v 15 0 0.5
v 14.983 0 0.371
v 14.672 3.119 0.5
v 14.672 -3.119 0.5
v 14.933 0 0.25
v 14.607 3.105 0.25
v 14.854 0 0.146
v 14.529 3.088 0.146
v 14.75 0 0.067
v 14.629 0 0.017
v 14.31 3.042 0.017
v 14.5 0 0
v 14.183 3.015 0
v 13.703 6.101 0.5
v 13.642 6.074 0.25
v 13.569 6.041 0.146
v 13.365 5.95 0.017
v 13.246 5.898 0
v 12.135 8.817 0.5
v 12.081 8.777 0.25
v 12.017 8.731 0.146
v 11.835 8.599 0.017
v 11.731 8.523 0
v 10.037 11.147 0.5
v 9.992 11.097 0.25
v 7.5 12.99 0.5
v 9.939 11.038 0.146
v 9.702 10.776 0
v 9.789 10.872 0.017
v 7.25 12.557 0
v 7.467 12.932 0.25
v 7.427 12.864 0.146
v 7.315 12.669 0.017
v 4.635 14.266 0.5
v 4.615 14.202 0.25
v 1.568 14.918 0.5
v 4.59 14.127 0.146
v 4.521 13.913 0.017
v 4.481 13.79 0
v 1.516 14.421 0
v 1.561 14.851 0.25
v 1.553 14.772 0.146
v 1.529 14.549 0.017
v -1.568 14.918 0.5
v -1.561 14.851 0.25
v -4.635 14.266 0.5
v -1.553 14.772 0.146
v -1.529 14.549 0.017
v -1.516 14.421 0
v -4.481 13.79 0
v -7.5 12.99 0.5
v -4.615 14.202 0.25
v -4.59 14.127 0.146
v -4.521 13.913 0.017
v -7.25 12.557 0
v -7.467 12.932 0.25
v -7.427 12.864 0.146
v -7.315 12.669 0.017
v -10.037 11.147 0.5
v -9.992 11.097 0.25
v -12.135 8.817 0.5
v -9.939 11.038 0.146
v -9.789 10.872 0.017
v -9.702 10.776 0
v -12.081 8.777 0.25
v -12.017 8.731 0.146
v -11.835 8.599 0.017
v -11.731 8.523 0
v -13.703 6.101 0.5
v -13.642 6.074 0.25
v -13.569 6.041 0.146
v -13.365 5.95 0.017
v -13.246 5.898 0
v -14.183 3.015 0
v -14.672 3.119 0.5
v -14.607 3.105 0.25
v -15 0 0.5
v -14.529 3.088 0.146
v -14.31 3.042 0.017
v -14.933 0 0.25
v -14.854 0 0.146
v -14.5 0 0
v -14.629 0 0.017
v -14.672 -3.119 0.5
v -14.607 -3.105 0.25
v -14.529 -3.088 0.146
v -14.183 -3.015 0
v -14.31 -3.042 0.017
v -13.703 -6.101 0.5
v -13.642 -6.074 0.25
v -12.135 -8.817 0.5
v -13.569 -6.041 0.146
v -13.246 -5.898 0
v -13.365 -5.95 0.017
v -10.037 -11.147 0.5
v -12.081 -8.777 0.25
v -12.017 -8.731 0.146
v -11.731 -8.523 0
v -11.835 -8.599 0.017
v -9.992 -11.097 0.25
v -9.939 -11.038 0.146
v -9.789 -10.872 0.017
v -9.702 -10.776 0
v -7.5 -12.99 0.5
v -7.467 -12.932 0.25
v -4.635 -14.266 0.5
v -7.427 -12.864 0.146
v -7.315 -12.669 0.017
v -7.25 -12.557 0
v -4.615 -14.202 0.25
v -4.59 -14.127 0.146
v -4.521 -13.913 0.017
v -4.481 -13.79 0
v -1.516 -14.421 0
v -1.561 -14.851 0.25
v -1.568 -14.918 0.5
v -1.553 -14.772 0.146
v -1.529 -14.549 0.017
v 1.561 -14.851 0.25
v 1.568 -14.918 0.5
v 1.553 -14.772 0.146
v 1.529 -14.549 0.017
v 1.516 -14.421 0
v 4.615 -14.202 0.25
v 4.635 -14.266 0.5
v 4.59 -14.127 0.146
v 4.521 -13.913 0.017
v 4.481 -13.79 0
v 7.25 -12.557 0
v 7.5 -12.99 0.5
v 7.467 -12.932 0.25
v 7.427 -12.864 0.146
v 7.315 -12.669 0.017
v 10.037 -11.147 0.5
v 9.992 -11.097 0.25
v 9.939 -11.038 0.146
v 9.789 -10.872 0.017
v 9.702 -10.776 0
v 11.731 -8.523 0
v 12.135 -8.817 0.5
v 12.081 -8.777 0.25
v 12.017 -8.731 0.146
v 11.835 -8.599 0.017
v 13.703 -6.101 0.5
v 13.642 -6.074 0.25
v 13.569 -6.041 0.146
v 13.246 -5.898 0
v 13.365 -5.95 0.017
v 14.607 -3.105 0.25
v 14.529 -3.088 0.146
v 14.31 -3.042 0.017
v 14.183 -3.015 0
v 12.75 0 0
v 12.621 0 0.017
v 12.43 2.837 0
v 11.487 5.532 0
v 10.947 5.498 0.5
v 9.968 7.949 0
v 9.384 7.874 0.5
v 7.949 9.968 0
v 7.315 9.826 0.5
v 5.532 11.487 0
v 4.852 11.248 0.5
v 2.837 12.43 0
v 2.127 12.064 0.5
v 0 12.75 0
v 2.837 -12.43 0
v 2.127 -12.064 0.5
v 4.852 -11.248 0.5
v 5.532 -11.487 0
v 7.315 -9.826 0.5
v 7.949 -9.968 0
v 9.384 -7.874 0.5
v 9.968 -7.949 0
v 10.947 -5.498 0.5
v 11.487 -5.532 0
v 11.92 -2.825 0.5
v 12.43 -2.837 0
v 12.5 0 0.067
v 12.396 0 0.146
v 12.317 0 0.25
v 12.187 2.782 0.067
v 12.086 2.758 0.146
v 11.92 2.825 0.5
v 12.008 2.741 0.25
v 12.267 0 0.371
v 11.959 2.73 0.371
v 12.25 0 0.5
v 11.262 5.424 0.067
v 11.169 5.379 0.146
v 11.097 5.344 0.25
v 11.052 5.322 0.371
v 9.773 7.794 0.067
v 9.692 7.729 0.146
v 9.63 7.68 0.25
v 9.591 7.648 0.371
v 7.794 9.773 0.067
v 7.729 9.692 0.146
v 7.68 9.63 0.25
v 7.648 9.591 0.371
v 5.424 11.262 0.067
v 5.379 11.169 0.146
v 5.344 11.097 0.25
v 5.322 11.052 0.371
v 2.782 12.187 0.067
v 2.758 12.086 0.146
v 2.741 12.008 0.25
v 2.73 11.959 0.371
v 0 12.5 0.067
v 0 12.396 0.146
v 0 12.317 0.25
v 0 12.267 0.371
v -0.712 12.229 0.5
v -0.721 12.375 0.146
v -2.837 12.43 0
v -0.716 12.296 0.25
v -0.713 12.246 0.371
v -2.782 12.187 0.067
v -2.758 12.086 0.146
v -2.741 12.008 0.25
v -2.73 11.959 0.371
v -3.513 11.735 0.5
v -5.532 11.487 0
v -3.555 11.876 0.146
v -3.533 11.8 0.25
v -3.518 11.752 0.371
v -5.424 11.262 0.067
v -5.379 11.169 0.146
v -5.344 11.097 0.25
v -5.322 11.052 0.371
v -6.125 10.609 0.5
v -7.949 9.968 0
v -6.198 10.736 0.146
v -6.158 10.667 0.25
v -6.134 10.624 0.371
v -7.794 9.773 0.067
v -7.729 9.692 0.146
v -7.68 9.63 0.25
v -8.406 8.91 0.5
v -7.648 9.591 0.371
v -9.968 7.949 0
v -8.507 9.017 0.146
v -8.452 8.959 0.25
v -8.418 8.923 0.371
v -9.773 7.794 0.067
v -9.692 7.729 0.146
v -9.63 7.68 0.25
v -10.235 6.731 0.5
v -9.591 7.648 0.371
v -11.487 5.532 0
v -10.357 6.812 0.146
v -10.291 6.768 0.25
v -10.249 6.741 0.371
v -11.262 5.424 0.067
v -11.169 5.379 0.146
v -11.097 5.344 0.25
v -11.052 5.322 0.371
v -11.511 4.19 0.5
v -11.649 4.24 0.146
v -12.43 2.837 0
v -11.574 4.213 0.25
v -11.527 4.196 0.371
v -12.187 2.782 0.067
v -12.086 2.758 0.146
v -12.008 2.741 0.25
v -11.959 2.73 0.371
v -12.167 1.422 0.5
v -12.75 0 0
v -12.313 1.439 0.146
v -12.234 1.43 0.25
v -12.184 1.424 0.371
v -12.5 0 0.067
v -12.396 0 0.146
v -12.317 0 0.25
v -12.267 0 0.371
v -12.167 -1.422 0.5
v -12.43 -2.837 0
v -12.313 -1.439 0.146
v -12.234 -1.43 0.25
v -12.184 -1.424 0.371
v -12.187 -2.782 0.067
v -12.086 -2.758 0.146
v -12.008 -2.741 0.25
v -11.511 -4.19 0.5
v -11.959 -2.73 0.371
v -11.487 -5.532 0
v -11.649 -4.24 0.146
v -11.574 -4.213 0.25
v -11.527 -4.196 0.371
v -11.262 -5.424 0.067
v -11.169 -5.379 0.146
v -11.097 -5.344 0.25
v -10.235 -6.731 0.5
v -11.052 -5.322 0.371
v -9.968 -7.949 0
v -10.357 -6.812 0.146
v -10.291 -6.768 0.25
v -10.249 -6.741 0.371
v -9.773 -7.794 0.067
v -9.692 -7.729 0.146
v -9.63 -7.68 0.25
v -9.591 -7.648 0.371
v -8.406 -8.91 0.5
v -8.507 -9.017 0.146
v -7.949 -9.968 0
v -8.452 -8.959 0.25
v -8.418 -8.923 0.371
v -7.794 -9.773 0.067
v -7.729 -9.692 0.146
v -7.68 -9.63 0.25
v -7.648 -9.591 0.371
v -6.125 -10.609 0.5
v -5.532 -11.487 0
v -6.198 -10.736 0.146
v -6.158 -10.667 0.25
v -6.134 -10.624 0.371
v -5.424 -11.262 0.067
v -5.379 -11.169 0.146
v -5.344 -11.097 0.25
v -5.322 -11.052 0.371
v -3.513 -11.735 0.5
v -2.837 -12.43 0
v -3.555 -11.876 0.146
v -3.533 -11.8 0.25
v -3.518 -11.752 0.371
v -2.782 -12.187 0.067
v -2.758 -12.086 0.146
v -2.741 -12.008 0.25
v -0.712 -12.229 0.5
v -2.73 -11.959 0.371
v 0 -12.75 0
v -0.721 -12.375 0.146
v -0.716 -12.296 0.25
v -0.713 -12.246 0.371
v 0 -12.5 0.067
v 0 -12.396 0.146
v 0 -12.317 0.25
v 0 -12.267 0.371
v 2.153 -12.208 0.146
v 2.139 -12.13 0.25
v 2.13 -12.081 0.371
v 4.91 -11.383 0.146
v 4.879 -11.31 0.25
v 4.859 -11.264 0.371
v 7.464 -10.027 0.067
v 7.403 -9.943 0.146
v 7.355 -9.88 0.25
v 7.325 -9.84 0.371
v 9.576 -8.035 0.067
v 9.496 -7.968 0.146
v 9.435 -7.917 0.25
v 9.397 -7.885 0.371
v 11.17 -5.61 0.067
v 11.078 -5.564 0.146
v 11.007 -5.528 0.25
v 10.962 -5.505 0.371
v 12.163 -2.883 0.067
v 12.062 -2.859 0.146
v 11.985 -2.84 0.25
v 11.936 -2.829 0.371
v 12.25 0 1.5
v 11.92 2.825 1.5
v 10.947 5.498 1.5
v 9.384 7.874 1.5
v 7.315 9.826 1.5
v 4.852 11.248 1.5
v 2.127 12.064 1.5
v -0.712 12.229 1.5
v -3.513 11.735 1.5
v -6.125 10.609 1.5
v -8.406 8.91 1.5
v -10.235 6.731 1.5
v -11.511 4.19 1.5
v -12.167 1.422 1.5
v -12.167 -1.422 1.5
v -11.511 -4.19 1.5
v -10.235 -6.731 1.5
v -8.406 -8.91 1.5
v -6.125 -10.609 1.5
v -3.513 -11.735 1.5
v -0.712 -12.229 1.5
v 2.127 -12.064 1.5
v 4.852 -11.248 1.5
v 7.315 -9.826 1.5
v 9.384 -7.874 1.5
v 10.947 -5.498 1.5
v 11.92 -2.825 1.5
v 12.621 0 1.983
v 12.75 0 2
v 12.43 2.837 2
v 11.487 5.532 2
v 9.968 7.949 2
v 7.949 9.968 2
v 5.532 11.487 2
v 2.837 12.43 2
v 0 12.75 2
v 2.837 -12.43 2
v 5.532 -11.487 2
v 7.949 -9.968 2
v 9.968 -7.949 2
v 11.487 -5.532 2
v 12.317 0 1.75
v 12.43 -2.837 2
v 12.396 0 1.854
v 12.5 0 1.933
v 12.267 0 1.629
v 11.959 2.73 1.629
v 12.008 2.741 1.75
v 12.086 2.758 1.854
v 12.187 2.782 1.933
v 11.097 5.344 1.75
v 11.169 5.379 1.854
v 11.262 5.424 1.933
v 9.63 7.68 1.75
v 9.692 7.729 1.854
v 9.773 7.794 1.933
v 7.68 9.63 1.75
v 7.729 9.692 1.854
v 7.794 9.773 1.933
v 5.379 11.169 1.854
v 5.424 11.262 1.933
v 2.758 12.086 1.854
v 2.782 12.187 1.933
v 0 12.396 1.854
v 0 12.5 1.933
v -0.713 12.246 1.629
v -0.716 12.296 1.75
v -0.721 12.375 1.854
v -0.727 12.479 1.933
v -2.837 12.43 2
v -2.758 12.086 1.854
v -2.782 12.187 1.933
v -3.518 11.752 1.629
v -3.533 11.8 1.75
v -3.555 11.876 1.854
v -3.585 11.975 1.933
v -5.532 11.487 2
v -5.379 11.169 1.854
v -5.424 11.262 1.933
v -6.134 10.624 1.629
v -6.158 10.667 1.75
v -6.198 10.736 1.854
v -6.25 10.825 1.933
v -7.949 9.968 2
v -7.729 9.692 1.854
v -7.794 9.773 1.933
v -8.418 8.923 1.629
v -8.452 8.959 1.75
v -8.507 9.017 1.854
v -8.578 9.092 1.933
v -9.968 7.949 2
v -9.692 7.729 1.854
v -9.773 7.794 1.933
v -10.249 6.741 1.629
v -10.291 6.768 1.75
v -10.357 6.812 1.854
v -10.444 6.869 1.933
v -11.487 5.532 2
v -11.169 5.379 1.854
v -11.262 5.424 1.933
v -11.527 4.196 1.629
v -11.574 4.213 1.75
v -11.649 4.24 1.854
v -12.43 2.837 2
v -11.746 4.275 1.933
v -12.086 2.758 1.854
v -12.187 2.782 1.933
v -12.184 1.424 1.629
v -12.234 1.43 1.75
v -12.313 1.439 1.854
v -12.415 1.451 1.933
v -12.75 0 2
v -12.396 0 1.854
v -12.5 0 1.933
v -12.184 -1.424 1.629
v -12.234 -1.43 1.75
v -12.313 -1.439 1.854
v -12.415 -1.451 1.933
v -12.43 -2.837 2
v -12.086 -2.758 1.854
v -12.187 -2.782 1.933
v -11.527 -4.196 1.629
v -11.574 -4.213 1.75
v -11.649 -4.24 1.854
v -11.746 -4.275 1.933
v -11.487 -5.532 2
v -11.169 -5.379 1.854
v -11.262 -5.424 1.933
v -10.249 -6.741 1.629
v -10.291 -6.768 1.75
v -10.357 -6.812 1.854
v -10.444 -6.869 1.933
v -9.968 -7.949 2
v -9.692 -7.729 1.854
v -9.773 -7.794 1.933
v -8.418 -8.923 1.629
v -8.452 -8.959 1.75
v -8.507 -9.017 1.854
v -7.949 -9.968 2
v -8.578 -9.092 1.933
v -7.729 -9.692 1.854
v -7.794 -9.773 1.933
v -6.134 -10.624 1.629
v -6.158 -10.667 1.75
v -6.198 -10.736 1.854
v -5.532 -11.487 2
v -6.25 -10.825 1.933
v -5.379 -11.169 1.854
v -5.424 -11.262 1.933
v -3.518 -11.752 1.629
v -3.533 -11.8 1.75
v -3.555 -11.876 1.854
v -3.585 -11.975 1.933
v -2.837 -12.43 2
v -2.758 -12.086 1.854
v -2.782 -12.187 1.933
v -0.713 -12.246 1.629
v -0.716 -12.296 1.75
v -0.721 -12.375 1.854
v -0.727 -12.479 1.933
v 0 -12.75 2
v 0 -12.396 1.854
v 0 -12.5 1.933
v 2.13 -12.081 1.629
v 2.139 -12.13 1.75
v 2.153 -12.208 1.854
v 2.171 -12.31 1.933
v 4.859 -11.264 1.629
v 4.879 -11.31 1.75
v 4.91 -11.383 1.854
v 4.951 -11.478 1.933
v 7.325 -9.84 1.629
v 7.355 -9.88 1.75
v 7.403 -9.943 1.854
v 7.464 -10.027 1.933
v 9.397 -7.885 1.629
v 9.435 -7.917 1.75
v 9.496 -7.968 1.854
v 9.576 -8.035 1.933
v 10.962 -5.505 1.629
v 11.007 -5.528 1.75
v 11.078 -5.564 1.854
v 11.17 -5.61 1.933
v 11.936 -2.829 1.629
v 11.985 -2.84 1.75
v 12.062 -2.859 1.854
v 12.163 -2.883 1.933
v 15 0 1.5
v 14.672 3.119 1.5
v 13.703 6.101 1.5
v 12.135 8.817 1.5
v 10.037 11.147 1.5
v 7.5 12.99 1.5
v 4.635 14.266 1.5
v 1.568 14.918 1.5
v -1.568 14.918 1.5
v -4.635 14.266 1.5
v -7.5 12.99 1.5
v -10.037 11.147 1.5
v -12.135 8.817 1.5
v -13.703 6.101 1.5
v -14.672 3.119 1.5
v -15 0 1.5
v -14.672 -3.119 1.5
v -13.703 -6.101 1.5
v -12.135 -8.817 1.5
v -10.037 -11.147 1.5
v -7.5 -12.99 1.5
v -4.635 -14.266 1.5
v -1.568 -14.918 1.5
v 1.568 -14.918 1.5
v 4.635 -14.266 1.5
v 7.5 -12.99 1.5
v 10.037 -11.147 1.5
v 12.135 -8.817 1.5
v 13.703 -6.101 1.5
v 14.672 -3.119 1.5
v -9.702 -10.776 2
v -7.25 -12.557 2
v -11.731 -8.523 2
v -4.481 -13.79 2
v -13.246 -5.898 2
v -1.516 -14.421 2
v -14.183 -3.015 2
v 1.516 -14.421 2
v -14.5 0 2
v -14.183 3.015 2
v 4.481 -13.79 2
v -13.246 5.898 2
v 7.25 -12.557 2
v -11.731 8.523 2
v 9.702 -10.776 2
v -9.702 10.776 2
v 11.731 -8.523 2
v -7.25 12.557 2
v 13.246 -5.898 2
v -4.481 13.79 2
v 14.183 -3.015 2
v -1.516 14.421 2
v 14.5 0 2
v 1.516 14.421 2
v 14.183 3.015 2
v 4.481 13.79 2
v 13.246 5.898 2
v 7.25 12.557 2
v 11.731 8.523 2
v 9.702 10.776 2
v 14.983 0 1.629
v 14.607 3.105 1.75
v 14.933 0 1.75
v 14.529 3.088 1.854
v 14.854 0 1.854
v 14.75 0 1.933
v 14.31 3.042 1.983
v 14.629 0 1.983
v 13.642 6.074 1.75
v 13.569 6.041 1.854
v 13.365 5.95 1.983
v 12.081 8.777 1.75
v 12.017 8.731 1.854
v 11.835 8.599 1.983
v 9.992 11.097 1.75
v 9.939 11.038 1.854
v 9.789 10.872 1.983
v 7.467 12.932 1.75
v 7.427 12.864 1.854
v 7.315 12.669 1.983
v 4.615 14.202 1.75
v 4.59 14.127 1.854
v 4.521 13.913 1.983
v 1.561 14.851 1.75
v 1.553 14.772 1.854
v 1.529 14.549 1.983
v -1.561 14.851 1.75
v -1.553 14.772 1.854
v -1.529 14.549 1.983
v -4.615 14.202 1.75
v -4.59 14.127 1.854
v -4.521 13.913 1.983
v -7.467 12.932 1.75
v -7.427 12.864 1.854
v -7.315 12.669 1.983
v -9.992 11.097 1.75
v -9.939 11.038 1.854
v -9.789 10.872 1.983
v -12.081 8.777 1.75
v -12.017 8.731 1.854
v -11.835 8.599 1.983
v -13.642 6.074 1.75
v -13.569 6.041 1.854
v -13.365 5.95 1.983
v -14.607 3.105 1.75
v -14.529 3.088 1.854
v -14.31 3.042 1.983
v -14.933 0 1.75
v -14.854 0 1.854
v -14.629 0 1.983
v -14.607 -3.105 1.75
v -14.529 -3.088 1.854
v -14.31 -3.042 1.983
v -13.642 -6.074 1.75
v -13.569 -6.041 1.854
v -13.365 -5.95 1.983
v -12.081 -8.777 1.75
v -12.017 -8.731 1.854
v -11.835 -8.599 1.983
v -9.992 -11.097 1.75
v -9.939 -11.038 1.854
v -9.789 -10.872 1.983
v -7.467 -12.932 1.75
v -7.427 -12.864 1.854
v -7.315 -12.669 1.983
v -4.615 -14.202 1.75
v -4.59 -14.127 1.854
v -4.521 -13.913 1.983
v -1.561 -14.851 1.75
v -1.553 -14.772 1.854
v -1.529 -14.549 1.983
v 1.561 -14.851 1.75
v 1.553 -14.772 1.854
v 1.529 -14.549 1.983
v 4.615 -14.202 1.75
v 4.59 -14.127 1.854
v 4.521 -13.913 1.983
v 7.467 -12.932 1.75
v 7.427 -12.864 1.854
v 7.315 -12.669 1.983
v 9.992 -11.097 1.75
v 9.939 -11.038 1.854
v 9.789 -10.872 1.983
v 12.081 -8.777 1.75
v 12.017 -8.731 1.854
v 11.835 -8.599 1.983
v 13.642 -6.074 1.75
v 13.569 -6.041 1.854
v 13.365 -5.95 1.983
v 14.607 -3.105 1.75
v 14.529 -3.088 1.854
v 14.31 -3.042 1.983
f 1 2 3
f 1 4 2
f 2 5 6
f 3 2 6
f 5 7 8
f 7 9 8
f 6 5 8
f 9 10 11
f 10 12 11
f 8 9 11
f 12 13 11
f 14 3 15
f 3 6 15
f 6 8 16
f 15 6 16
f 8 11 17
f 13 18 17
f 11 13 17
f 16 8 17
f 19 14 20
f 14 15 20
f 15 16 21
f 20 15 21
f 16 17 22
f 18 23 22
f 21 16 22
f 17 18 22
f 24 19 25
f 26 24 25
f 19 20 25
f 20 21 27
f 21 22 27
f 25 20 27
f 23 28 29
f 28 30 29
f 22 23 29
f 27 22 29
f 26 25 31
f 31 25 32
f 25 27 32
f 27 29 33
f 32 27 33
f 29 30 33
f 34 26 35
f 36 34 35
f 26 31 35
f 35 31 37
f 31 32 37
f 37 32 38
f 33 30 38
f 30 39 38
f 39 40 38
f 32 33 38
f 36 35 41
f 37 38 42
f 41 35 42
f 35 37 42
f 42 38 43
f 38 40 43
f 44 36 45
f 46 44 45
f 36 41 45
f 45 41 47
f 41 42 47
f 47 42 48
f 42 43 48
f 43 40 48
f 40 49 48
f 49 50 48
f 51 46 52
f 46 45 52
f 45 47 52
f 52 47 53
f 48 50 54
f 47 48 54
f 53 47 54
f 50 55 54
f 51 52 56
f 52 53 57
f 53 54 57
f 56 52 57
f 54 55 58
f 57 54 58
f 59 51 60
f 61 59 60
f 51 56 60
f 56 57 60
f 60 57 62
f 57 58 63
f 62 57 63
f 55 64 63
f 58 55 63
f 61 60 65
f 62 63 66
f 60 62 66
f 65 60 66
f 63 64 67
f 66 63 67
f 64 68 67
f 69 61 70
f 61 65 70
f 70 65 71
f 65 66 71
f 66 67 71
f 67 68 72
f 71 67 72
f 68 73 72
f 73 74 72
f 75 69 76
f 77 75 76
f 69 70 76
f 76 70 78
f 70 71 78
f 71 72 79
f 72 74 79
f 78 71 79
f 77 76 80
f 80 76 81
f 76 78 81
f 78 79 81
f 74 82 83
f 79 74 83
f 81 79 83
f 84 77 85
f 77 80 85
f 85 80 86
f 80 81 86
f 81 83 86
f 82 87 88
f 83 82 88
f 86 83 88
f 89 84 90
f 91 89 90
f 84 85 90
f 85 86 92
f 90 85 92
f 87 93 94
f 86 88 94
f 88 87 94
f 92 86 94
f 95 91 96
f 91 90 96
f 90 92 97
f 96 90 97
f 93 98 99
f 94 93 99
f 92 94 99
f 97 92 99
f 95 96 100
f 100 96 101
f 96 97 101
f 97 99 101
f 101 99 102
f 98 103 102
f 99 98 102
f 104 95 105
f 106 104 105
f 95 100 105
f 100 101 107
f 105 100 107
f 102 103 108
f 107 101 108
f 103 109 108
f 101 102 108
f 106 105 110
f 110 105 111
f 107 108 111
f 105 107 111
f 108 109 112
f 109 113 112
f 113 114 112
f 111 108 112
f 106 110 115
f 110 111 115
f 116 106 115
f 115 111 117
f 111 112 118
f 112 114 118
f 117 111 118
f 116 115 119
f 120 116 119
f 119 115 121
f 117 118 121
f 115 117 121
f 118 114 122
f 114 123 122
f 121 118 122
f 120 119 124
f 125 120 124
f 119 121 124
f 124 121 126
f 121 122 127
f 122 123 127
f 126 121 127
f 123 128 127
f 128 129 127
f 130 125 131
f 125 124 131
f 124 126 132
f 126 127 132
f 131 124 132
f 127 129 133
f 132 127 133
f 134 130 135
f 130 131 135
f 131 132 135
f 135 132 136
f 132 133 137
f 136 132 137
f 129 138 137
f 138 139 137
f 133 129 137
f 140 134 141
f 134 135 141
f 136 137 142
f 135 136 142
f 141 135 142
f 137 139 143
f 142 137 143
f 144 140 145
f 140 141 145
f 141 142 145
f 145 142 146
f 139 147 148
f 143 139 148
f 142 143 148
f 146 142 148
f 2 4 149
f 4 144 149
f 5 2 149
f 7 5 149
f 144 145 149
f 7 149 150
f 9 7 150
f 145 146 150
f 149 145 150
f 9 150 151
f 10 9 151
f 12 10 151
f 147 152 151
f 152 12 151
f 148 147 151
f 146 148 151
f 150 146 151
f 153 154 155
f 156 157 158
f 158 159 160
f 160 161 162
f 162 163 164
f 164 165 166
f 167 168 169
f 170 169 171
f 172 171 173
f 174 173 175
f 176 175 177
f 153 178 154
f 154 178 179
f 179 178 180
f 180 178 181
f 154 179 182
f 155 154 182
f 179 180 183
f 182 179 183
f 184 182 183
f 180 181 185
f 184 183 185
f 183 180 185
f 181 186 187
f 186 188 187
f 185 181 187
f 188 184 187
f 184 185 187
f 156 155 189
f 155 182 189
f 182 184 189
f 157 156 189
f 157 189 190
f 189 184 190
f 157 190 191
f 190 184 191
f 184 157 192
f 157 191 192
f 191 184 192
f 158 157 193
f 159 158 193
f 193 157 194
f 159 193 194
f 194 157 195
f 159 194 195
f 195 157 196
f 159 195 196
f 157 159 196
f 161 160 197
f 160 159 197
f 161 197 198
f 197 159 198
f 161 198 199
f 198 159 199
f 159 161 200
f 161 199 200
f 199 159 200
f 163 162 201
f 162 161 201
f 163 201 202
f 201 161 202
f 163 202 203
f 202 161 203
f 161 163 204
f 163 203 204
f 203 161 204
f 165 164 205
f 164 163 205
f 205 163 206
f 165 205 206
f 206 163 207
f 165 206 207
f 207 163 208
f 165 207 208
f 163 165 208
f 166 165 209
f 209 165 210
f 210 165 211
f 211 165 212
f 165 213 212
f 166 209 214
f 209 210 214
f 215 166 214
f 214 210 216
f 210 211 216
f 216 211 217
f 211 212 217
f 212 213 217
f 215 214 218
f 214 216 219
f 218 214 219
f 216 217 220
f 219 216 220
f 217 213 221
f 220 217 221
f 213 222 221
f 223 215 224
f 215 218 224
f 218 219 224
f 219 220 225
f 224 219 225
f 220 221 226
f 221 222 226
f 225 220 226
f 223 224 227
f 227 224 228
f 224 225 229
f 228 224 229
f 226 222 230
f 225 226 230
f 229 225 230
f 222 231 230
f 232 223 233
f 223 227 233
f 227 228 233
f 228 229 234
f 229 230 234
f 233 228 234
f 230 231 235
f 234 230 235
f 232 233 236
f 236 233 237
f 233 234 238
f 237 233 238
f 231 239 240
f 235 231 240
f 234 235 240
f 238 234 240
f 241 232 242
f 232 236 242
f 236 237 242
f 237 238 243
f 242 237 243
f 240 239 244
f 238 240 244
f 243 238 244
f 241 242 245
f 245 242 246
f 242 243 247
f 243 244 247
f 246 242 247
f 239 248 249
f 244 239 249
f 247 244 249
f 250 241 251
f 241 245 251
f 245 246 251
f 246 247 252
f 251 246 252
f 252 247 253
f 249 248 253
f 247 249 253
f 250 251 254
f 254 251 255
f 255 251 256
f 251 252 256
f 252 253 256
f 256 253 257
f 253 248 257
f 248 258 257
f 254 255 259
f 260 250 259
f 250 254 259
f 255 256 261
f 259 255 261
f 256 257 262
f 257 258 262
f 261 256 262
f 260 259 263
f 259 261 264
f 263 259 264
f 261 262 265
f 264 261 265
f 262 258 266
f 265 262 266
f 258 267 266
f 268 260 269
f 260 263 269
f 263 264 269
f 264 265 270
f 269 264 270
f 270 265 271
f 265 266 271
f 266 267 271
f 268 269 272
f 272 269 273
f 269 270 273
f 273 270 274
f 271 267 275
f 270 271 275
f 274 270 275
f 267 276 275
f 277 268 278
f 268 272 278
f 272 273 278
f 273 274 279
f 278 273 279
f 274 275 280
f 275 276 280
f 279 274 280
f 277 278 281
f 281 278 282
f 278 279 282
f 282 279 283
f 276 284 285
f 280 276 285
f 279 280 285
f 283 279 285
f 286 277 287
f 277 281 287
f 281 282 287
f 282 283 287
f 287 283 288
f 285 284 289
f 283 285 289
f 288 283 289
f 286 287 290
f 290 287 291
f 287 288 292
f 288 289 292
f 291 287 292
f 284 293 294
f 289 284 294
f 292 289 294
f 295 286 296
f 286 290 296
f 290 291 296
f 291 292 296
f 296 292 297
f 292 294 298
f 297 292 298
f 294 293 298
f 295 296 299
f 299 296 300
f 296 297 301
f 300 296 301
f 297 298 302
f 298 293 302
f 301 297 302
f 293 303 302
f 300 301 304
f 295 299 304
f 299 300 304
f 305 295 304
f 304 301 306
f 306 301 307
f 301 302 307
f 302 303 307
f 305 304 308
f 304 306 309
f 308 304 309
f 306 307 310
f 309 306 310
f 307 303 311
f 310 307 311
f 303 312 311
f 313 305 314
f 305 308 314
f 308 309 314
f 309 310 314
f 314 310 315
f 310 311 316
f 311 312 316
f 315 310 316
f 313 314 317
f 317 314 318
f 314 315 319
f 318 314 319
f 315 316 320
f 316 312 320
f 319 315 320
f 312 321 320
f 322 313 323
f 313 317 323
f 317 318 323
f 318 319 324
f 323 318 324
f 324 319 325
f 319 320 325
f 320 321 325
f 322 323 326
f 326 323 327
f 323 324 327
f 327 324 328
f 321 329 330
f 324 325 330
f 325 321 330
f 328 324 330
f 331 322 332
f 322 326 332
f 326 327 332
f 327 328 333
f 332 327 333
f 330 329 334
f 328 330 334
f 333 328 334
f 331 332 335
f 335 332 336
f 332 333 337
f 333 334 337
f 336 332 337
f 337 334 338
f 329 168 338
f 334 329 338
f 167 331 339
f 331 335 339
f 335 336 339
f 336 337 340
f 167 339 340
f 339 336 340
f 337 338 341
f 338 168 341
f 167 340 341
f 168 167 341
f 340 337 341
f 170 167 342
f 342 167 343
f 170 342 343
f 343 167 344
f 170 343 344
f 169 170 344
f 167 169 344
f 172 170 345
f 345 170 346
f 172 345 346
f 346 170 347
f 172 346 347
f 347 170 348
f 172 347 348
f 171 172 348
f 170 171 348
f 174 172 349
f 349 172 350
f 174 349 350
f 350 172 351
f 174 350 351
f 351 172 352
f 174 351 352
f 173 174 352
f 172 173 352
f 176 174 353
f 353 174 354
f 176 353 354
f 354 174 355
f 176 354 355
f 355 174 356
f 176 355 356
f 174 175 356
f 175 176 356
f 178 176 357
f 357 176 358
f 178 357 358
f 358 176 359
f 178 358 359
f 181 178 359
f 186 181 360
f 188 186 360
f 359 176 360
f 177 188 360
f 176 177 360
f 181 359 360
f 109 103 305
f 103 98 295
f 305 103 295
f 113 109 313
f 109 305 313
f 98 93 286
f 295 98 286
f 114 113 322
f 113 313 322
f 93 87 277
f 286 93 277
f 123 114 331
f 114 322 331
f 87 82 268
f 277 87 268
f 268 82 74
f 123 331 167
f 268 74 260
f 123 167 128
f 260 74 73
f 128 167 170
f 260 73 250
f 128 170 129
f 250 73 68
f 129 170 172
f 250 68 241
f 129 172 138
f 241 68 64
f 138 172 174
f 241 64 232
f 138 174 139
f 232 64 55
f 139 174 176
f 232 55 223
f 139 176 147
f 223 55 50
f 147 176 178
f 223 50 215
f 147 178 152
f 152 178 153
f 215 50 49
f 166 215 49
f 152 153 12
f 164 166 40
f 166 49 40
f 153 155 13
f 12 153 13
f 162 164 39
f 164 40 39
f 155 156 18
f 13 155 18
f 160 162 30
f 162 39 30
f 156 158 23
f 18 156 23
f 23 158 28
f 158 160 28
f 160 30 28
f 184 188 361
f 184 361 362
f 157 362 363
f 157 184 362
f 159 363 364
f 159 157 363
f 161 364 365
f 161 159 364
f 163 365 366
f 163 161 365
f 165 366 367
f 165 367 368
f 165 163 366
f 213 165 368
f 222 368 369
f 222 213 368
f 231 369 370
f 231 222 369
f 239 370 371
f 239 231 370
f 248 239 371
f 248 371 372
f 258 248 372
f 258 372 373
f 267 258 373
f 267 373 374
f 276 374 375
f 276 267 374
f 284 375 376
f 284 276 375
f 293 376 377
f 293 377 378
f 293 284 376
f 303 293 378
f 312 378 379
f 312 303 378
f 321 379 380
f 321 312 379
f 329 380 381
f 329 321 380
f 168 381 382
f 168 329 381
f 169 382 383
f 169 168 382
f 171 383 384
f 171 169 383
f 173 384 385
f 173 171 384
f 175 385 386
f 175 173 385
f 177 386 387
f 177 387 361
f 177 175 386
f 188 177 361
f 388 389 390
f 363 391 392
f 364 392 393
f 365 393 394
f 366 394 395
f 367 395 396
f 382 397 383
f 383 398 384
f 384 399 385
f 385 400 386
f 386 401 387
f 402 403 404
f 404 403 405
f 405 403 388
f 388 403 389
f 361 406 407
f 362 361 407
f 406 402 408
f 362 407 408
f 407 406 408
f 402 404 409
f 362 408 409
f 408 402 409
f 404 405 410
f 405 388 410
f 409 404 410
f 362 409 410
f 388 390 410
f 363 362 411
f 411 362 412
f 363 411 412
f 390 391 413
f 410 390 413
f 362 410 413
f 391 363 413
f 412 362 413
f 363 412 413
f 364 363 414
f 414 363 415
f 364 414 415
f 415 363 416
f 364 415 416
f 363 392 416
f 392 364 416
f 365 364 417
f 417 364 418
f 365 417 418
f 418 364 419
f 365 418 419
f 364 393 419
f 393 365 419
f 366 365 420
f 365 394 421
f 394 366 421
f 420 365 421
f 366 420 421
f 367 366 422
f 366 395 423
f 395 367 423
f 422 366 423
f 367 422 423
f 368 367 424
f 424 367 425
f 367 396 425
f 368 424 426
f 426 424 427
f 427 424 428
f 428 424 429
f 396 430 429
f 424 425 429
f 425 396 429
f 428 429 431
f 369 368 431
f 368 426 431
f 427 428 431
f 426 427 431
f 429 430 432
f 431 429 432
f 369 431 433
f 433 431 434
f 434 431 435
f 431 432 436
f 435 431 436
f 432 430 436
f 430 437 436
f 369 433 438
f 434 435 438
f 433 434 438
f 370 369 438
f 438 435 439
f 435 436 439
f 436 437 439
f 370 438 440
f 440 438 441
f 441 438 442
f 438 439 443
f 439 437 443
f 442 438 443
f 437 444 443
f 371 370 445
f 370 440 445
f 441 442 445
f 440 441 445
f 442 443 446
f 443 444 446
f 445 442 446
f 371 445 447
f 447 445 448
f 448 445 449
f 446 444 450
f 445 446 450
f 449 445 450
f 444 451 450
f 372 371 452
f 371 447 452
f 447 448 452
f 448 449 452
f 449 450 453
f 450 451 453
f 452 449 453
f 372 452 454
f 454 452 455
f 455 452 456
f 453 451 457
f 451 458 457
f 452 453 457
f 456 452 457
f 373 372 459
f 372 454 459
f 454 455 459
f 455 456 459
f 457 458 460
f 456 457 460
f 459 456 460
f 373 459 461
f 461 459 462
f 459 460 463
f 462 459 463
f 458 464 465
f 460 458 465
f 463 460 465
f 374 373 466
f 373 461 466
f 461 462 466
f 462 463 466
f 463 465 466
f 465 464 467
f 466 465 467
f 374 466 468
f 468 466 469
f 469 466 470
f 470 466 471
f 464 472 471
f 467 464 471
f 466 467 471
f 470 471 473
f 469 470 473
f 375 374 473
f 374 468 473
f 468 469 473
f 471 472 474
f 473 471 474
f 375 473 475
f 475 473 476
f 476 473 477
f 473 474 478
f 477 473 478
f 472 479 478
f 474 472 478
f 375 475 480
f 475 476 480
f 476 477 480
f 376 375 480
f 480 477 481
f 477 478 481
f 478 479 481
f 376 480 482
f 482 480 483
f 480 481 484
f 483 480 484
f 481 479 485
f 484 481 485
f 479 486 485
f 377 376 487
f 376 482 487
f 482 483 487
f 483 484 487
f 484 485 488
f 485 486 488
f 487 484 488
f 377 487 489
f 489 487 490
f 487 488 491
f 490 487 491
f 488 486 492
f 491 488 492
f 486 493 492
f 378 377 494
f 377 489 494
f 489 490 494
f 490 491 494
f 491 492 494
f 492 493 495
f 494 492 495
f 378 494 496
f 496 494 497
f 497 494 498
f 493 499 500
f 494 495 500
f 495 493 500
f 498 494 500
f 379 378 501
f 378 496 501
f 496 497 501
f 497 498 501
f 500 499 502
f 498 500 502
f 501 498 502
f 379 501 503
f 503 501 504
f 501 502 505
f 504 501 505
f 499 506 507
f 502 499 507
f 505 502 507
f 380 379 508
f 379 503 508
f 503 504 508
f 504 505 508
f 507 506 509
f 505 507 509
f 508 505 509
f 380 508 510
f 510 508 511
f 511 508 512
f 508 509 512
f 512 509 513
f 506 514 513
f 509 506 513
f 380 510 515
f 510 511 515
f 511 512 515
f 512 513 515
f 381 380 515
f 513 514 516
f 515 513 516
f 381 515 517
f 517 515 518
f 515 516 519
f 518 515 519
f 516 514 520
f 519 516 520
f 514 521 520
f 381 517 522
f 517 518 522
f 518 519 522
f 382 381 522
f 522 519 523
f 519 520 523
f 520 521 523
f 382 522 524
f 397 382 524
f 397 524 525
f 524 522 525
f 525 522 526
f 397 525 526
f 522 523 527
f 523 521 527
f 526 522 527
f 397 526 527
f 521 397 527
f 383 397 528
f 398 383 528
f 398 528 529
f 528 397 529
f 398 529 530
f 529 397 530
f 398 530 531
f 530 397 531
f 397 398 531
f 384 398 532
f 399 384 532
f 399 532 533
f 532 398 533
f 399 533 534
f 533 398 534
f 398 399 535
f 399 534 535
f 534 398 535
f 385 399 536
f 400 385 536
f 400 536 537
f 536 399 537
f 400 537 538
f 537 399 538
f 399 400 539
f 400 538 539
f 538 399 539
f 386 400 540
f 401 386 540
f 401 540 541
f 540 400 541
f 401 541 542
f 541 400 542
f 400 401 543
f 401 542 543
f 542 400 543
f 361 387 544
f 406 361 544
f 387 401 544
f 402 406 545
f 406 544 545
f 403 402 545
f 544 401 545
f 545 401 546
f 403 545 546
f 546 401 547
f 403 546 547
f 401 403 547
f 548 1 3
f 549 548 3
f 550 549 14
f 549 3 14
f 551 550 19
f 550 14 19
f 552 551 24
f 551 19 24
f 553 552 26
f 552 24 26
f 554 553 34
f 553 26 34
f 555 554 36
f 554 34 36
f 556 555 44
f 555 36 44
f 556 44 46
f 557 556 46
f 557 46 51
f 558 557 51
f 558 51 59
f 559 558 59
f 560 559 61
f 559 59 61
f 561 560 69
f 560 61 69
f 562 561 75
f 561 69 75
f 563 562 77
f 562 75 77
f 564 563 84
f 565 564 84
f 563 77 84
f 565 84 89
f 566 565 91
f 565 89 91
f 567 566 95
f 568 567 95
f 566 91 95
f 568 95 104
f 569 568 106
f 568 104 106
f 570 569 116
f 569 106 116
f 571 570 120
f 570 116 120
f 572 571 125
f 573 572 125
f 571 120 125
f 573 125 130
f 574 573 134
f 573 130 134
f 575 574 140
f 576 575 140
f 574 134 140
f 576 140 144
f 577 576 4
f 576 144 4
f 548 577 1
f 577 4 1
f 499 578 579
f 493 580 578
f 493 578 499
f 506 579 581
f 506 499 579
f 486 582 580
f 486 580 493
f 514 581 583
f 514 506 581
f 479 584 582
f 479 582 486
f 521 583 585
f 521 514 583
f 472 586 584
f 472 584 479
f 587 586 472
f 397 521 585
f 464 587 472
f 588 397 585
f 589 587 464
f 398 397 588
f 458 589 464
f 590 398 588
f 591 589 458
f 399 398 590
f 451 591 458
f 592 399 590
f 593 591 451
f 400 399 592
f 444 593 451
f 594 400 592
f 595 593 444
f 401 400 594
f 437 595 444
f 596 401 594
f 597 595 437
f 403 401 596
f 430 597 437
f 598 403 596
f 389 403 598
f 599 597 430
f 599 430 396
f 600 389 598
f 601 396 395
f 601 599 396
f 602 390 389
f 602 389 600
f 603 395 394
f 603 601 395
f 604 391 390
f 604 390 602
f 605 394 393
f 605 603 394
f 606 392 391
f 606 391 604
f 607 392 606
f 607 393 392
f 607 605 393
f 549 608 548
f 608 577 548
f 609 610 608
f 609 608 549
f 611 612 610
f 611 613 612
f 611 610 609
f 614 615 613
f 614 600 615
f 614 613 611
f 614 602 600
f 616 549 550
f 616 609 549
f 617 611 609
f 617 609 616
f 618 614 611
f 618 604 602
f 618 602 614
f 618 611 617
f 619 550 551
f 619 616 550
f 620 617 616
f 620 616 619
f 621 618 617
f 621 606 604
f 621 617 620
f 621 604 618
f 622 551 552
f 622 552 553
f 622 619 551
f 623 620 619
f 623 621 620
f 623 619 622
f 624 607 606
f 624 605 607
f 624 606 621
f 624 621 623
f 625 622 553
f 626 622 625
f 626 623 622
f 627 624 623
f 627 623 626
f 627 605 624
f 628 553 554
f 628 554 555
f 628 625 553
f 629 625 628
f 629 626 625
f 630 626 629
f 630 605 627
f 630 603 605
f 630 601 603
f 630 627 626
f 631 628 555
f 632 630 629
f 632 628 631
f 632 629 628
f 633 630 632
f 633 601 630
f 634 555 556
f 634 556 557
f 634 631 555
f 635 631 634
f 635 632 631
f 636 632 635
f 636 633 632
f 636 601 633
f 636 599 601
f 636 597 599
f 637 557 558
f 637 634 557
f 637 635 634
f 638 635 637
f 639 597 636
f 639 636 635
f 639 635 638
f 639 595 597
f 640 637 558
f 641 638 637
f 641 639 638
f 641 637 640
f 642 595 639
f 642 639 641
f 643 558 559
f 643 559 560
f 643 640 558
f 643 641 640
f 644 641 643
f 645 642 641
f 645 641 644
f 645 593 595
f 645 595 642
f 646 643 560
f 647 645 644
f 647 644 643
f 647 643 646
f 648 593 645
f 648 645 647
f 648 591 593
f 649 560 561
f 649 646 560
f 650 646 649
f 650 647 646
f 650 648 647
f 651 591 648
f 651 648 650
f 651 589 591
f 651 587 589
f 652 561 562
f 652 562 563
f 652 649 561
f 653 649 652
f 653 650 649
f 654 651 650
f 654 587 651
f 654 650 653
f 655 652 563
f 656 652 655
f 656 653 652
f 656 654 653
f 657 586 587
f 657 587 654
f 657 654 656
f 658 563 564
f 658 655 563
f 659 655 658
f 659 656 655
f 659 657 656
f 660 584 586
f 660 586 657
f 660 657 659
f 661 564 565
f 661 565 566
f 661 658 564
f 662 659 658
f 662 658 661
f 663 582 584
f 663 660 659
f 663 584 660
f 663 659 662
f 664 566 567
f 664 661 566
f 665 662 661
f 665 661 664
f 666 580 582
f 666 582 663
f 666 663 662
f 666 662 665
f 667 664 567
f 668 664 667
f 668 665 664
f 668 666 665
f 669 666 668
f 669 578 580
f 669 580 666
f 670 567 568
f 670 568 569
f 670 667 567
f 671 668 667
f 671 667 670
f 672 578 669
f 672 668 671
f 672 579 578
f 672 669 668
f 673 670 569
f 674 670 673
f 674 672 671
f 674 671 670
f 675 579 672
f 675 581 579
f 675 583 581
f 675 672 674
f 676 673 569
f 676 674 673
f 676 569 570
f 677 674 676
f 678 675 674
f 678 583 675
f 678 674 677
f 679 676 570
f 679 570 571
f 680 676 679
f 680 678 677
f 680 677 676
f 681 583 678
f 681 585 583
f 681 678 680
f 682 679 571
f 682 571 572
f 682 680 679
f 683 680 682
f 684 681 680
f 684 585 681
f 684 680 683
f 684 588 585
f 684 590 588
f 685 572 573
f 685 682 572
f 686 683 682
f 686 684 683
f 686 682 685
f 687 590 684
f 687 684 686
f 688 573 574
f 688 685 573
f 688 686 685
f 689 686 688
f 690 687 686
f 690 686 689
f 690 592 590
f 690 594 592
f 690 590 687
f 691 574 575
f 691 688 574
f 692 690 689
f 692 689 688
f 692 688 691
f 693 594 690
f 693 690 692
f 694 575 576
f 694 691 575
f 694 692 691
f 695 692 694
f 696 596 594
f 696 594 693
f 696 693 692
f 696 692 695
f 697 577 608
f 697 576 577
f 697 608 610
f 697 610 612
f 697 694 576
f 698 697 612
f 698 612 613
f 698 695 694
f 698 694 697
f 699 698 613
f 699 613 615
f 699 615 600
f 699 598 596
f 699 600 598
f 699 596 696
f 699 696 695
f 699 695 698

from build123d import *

# Parameters (mm, degrees)
SKETCH1_R           = 15
SKETCH1_R_2         = 12.25
BOSS_EXTRUDE1_DEPTH = 2
FILLET1_R           = 0.5
FILLET2_R           = 0.5
FILLET3_R           = 0.5


with BuildPart() as part:
    # Sketch1 → Boss-Extrude1 (new body)
    with BuildSketch(Plane.XY):
        Circle(SKETCH1_R)
        Circle(SKETCH1_R_2, mode=Mode.SUBTRACT)
    extrude(amount=BOSS_EXTRUDE1_DEPTH)

    # Fillet1
    fillet1_edges = [part.edges().sort_by_distance(p)[0] for p in [
        (-15, 0, 2),
        (-12.25, 0, 2),
    ]]
    fillet(fillet1_edges, radius=FILLET1_R)

    # Fillet2
    fillet2_edges = [part.edges().sort_by_distance(p)[0] for p in [
        (-15, 0, 0),
    ]]
    fillet(fillet2_edges, radius=FILLET2_R)

    # Fillet3
    fillet3_edges = [part.edges().sort_by_distance(p)[0] for p in [
        (-12.25, 0, 0),
    ]]
    fillet(fillet3_edges, radius=FILLET3_R)


solid = part.part
